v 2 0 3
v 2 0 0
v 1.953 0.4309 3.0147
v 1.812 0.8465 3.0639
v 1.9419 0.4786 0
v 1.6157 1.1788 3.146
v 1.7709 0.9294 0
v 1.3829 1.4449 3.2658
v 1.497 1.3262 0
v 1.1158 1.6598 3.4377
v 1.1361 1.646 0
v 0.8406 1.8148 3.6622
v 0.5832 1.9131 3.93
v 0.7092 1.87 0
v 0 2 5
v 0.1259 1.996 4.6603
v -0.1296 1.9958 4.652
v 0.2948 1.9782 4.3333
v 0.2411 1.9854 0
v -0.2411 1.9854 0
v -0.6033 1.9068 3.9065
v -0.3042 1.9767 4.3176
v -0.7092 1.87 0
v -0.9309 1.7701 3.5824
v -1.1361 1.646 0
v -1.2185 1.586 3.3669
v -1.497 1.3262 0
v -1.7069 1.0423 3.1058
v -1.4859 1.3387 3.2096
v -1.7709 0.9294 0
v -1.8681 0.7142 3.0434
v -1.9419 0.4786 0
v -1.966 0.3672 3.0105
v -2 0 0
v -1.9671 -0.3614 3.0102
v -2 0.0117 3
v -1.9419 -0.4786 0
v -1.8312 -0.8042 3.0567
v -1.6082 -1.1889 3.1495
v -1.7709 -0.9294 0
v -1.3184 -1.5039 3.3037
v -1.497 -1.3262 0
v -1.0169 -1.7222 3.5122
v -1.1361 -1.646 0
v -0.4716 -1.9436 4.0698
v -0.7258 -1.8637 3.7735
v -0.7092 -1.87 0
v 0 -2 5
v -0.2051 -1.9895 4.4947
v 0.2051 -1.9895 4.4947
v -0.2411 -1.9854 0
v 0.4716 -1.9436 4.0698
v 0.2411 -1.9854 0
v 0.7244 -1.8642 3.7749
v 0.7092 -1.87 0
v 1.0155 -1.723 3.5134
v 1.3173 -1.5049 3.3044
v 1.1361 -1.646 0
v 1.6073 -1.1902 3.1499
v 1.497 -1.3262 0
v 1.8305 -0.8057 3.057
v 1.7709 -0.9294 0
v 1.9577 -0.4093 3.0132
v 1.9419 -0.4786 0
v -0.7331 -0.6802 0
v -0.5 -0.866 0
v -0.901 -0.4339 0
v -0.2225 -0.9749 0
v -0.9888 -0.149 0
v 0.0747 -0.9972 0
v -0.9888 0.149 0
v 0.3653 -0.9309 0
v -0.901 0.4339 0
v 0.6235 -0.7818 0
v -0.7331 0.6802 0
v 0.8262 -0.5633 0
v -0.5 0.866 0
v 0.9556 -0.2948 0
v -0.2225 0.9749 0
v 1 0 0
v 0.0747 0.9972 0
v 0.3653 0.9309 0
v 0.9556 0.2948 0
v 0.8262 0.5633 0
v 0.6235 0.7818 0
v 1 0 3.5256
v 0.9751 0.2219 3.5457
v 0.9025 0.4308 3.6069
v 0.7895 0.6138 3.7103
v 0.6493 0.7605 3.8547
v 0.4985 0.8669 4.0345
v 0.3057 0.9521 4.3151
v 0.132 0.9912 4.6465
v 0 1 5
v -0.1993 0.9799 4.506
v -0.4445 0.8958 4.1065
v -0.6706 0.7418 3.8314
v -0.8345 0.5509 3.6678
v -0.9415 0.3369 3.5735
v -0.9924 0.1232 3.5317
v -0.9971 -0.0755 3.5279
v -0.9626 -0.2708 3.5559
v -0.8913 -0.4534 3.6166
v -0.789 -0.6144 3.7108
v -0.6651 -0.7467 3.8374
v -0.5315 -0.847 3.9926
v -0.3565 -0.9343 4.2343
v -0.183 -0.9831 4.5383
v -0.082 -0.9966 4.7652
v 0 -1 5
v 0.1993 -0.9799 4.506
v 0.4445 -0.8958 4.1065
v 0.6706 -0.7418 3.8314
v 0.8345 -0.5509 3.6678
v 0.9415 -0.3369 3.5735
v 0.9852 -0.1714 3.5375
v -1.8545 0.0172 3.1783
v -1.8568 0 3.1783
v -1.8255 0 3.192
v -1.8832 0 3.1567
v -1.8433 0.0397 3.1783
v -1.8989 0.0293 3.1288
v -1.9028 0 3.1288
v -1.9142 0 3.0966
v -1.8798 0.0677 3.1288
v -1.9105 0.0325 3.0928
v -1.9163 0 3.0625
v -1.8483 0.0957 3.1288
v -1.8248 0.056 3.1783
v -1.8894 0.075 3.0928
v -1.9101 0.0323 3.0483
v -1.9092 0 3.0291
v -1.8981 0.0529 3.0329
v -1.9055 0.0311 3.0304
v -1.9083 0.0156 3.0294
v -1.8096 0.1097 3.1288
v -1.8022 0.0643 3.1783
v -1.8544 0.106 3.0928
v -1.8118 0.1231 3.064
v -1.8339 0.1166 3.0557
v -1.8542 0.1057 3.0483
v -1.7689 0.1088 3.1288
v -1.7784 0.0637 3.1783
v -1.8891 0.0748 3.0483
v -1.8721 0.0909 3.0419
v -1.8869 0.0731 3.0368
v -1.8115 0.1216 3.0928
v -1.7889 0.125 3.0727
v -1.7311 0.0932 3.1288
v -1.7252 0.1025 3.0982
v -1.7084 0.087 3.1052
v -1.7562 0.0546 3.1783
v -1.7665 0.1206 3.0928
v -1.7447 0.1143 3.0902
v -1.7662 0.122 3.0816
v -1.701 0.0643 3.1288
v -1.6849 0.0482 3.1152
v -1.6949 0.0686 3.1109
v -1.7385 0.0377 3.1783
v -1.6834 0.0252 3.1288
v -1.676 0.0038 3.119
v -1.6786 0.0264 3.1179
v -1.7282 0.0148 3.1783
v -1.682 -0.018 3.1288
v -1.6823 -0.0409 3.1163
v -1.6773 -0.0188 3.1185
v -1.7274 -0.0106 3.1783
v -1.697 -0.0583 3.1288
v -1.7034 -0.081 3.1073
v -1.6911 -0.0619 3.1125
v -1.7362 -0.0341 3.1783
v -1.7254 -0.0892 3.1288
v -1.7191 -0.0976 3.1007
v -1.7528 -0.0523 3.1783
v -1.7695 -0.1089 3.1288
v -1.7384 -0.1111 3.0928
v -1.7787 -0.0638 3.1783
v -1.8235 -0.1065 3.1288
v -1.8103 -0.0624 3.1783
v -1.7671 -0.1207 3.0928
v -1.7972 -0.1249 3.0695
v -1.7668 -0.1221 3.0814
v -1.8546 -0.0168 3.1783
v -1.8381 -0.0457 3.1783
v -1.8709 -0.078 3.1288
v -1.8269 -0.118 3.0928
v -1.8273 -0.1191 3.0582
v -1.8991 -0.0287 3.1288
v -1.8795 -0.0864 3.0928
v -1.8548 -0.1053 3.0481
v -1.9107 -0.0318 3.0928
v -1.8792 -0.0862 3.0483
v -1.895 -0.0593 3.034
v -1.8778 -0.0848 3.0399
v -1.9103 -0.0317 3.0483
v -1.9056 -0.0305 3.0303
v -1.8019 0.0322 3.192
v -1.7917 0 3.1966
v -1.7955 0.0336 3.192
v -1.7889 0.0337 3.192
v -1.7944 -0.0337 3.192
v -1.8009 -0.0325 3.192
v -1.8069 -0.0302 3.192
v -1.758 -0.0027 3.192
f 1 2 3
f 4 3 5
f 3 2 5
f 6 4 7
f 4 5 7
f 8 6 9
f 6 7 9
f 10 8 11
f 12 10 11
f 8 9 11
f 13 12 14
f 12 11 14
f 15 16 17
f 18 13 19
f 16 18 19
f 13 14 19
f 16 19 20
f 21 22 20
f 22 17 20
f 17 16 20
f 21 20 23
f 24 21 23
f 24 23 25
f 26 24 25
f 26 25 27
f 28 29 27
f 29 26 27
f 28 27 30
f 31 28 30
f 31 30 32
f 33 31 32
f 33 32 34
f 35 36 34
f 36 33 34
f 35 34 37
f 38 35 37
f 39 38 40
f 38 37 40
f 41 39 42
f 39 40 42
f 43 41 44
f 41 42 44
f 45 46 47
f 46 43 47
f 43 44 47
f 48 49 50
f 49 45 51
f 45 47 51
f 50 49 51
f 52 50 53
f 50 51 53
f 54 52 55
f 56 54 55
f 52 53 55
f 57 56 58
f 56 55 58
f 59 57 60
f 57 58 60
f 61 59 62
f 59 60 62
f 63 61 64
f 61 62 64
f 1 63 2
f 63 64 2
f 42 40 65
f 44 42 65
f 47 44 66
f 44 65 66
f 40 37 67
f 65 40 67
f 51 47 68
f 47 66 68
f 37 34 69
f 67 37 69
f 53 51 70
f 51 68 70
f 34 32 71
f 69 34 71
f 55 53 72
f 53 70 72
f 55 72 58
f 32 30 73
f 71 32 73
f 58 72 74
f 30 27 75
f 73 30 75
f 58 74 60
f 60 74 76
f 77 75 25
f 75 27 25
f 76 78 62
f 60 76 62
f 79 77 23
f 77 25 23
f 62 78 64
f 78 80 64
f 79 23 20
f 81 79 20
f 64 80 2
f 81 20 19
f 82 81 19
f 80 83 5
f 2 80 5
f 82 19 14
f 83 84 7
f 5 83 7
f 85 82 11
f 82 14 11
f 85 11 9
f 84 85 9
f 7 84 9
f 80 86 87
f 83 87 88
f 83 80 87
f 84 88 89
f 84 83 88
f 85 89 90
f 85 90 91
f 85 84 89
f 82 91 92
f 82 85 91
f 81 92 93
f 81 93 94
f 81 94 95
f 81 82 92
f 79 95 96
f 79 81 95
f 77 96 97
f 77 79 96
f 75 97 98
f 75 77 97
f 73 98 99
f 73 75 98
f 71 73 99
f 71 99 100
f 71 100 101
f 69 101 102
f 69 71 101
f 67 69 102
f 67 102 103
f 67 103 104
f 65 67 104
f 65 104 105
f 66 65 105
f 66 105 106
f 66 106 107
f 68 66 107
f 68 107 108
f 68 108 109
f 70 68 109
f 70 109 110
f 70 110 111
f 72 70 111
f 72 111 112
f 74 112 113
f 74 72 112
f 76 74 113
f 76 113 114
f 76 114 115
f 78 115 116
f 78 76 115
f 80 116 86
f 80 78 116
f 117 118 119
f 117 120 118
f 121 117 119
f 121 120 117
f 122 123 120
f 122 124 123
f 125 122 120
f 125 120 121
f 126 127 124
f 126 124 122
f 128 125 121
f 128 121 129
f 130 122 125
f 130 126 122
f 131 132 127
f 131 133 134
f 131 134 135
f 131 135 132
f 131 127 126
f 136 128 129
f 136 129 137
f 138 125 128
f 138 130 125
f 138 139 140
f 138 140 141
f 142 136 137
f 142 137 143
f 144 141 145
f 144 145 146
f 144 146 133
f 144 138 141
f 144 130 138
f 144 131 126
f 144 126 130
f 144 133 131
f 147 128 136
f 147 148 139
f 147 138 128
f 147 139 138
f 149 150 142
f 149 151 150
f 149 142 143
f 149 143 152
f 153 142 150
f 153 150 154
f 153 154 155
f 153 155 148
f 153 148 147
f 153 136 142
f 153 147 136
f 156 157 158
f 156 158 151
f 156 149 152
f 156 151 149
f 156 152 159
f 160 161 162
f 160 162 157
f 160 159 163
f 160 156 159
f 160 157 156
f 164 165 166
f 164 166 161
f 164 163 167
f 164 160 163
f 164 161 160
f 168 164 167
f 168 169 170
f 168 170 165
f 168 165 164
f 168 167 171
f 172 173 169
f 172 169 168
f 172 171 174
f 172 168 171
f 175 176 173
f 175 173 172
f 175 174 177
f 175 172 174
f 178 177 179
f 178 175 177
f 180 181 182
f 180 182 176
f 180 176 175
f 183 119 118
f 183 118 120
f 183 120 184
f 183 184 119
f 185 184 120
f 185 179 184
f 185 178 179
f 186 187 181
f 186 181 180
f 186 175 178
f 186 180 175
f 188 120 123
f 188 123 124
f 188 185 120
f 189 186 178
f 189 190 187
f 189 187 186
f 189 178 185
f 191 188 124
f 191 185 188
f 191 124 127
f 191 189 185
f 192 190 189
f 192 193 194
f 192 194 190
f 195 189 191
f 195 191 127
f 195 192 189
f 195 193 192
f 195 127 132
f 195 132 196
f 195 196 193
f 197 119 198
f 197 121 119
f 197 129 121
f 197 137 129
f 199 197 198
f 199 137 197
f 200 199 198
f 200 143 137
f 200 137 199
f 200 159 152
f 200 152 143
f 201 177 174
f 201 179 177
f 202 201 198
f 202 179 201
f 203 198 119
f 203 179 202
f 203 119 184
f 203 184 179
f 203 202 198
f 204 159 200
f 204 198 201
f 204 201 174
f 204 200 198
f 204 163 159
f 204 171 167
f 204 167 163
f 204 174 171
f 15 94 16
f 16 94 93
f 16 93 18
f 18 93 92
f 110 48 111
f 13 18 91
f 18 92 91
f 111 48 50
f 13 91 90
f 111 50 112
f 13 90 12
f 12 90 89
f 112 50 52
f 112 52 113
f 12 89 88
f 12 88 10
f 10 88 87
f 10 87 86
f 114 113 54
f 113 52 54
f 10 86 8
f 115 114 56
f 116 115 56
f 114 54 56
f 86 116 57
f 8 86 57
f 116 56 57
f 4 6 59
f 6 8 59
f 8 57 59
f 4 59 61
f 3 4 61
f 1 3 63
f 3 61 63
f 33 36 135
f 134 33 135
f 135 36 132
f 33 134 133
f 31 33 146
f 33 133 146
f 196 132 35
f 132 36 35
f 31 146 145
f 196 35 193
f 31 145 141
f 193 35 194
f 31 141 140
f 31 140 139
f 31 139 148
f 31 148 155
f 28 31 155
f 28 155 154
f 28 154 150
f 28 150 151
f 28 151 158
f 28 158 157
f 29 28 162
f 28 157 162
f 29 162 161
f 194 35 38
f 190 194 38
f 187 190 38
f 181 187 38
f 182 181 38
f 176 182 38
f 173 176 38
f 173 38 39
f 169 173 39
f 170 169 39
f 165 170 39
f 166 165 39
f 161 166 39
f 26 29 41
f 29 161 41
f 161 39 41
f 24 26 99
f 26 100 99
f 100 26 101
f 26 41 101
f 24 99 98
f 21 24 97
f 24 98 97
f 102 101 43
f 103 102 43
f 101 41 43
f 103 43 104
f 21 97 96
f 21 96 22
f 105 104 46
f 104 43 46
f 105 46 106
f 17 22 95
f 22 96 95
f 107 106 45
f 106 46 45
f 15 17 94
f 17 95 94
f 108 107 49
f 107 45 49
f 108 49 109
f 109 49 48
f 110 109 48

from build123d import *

# Parameters (mm, degrees)
F0_R     = 2
F0_R_2   = 1
F1_DEPTH = 5
F3_DEPTH = 12.5


with BuildPart() as f1:
    # F0 (on Top) → F1 (new body)
    with BuildSketch(Plane.XY):
        Circle(F0_R)
        Circle(F0_R_2, mode=Mode.SUBTRACT)
    extrude(amount=F1_DEPTH)

    # F2 (on Front) → F3 (cut, symmetric)
    with BuildSketch(Plane.XZ):
        with BuildLine():
            Line((-2, 5), (-2, 3))
            ThreePointArc((-2, 3), (-0.749508, 3.749508), (0, 5))
            Line((0, 5), (-2, 5))
        make_face()
        with BuildLine():
            Line((2, 5), (0, 5))
            ThreePointArc((0, 5), (0.749508, 3.749508), (2, 3))
            Line((2, 3), (2, 5))
        make_face()
    extrude(amount=F3_DEPTH, both=True, mode=Mode.SUBTRACT)

    # F4 (on Front) → F5 (revolve)
    with BuildSketch(Plane.XZ):
        with BuildLine():
            ThreePointArc((-1.90921, 3.029123), (-1.863462, 2.969324), (-1.791666, 2.946649))
            Line((-1.791666, 2.946649), (-1.791666, 3.196649))
            ThreePointArc((-1.791666, 3.196649), (-1.893991, 3.143445), (-1.90921, 3.029123))
        make_face()
    revolve(axis=Axis((-1.791666, 0, 3.071649), (0, 0, -1)))


solid = f1.part
